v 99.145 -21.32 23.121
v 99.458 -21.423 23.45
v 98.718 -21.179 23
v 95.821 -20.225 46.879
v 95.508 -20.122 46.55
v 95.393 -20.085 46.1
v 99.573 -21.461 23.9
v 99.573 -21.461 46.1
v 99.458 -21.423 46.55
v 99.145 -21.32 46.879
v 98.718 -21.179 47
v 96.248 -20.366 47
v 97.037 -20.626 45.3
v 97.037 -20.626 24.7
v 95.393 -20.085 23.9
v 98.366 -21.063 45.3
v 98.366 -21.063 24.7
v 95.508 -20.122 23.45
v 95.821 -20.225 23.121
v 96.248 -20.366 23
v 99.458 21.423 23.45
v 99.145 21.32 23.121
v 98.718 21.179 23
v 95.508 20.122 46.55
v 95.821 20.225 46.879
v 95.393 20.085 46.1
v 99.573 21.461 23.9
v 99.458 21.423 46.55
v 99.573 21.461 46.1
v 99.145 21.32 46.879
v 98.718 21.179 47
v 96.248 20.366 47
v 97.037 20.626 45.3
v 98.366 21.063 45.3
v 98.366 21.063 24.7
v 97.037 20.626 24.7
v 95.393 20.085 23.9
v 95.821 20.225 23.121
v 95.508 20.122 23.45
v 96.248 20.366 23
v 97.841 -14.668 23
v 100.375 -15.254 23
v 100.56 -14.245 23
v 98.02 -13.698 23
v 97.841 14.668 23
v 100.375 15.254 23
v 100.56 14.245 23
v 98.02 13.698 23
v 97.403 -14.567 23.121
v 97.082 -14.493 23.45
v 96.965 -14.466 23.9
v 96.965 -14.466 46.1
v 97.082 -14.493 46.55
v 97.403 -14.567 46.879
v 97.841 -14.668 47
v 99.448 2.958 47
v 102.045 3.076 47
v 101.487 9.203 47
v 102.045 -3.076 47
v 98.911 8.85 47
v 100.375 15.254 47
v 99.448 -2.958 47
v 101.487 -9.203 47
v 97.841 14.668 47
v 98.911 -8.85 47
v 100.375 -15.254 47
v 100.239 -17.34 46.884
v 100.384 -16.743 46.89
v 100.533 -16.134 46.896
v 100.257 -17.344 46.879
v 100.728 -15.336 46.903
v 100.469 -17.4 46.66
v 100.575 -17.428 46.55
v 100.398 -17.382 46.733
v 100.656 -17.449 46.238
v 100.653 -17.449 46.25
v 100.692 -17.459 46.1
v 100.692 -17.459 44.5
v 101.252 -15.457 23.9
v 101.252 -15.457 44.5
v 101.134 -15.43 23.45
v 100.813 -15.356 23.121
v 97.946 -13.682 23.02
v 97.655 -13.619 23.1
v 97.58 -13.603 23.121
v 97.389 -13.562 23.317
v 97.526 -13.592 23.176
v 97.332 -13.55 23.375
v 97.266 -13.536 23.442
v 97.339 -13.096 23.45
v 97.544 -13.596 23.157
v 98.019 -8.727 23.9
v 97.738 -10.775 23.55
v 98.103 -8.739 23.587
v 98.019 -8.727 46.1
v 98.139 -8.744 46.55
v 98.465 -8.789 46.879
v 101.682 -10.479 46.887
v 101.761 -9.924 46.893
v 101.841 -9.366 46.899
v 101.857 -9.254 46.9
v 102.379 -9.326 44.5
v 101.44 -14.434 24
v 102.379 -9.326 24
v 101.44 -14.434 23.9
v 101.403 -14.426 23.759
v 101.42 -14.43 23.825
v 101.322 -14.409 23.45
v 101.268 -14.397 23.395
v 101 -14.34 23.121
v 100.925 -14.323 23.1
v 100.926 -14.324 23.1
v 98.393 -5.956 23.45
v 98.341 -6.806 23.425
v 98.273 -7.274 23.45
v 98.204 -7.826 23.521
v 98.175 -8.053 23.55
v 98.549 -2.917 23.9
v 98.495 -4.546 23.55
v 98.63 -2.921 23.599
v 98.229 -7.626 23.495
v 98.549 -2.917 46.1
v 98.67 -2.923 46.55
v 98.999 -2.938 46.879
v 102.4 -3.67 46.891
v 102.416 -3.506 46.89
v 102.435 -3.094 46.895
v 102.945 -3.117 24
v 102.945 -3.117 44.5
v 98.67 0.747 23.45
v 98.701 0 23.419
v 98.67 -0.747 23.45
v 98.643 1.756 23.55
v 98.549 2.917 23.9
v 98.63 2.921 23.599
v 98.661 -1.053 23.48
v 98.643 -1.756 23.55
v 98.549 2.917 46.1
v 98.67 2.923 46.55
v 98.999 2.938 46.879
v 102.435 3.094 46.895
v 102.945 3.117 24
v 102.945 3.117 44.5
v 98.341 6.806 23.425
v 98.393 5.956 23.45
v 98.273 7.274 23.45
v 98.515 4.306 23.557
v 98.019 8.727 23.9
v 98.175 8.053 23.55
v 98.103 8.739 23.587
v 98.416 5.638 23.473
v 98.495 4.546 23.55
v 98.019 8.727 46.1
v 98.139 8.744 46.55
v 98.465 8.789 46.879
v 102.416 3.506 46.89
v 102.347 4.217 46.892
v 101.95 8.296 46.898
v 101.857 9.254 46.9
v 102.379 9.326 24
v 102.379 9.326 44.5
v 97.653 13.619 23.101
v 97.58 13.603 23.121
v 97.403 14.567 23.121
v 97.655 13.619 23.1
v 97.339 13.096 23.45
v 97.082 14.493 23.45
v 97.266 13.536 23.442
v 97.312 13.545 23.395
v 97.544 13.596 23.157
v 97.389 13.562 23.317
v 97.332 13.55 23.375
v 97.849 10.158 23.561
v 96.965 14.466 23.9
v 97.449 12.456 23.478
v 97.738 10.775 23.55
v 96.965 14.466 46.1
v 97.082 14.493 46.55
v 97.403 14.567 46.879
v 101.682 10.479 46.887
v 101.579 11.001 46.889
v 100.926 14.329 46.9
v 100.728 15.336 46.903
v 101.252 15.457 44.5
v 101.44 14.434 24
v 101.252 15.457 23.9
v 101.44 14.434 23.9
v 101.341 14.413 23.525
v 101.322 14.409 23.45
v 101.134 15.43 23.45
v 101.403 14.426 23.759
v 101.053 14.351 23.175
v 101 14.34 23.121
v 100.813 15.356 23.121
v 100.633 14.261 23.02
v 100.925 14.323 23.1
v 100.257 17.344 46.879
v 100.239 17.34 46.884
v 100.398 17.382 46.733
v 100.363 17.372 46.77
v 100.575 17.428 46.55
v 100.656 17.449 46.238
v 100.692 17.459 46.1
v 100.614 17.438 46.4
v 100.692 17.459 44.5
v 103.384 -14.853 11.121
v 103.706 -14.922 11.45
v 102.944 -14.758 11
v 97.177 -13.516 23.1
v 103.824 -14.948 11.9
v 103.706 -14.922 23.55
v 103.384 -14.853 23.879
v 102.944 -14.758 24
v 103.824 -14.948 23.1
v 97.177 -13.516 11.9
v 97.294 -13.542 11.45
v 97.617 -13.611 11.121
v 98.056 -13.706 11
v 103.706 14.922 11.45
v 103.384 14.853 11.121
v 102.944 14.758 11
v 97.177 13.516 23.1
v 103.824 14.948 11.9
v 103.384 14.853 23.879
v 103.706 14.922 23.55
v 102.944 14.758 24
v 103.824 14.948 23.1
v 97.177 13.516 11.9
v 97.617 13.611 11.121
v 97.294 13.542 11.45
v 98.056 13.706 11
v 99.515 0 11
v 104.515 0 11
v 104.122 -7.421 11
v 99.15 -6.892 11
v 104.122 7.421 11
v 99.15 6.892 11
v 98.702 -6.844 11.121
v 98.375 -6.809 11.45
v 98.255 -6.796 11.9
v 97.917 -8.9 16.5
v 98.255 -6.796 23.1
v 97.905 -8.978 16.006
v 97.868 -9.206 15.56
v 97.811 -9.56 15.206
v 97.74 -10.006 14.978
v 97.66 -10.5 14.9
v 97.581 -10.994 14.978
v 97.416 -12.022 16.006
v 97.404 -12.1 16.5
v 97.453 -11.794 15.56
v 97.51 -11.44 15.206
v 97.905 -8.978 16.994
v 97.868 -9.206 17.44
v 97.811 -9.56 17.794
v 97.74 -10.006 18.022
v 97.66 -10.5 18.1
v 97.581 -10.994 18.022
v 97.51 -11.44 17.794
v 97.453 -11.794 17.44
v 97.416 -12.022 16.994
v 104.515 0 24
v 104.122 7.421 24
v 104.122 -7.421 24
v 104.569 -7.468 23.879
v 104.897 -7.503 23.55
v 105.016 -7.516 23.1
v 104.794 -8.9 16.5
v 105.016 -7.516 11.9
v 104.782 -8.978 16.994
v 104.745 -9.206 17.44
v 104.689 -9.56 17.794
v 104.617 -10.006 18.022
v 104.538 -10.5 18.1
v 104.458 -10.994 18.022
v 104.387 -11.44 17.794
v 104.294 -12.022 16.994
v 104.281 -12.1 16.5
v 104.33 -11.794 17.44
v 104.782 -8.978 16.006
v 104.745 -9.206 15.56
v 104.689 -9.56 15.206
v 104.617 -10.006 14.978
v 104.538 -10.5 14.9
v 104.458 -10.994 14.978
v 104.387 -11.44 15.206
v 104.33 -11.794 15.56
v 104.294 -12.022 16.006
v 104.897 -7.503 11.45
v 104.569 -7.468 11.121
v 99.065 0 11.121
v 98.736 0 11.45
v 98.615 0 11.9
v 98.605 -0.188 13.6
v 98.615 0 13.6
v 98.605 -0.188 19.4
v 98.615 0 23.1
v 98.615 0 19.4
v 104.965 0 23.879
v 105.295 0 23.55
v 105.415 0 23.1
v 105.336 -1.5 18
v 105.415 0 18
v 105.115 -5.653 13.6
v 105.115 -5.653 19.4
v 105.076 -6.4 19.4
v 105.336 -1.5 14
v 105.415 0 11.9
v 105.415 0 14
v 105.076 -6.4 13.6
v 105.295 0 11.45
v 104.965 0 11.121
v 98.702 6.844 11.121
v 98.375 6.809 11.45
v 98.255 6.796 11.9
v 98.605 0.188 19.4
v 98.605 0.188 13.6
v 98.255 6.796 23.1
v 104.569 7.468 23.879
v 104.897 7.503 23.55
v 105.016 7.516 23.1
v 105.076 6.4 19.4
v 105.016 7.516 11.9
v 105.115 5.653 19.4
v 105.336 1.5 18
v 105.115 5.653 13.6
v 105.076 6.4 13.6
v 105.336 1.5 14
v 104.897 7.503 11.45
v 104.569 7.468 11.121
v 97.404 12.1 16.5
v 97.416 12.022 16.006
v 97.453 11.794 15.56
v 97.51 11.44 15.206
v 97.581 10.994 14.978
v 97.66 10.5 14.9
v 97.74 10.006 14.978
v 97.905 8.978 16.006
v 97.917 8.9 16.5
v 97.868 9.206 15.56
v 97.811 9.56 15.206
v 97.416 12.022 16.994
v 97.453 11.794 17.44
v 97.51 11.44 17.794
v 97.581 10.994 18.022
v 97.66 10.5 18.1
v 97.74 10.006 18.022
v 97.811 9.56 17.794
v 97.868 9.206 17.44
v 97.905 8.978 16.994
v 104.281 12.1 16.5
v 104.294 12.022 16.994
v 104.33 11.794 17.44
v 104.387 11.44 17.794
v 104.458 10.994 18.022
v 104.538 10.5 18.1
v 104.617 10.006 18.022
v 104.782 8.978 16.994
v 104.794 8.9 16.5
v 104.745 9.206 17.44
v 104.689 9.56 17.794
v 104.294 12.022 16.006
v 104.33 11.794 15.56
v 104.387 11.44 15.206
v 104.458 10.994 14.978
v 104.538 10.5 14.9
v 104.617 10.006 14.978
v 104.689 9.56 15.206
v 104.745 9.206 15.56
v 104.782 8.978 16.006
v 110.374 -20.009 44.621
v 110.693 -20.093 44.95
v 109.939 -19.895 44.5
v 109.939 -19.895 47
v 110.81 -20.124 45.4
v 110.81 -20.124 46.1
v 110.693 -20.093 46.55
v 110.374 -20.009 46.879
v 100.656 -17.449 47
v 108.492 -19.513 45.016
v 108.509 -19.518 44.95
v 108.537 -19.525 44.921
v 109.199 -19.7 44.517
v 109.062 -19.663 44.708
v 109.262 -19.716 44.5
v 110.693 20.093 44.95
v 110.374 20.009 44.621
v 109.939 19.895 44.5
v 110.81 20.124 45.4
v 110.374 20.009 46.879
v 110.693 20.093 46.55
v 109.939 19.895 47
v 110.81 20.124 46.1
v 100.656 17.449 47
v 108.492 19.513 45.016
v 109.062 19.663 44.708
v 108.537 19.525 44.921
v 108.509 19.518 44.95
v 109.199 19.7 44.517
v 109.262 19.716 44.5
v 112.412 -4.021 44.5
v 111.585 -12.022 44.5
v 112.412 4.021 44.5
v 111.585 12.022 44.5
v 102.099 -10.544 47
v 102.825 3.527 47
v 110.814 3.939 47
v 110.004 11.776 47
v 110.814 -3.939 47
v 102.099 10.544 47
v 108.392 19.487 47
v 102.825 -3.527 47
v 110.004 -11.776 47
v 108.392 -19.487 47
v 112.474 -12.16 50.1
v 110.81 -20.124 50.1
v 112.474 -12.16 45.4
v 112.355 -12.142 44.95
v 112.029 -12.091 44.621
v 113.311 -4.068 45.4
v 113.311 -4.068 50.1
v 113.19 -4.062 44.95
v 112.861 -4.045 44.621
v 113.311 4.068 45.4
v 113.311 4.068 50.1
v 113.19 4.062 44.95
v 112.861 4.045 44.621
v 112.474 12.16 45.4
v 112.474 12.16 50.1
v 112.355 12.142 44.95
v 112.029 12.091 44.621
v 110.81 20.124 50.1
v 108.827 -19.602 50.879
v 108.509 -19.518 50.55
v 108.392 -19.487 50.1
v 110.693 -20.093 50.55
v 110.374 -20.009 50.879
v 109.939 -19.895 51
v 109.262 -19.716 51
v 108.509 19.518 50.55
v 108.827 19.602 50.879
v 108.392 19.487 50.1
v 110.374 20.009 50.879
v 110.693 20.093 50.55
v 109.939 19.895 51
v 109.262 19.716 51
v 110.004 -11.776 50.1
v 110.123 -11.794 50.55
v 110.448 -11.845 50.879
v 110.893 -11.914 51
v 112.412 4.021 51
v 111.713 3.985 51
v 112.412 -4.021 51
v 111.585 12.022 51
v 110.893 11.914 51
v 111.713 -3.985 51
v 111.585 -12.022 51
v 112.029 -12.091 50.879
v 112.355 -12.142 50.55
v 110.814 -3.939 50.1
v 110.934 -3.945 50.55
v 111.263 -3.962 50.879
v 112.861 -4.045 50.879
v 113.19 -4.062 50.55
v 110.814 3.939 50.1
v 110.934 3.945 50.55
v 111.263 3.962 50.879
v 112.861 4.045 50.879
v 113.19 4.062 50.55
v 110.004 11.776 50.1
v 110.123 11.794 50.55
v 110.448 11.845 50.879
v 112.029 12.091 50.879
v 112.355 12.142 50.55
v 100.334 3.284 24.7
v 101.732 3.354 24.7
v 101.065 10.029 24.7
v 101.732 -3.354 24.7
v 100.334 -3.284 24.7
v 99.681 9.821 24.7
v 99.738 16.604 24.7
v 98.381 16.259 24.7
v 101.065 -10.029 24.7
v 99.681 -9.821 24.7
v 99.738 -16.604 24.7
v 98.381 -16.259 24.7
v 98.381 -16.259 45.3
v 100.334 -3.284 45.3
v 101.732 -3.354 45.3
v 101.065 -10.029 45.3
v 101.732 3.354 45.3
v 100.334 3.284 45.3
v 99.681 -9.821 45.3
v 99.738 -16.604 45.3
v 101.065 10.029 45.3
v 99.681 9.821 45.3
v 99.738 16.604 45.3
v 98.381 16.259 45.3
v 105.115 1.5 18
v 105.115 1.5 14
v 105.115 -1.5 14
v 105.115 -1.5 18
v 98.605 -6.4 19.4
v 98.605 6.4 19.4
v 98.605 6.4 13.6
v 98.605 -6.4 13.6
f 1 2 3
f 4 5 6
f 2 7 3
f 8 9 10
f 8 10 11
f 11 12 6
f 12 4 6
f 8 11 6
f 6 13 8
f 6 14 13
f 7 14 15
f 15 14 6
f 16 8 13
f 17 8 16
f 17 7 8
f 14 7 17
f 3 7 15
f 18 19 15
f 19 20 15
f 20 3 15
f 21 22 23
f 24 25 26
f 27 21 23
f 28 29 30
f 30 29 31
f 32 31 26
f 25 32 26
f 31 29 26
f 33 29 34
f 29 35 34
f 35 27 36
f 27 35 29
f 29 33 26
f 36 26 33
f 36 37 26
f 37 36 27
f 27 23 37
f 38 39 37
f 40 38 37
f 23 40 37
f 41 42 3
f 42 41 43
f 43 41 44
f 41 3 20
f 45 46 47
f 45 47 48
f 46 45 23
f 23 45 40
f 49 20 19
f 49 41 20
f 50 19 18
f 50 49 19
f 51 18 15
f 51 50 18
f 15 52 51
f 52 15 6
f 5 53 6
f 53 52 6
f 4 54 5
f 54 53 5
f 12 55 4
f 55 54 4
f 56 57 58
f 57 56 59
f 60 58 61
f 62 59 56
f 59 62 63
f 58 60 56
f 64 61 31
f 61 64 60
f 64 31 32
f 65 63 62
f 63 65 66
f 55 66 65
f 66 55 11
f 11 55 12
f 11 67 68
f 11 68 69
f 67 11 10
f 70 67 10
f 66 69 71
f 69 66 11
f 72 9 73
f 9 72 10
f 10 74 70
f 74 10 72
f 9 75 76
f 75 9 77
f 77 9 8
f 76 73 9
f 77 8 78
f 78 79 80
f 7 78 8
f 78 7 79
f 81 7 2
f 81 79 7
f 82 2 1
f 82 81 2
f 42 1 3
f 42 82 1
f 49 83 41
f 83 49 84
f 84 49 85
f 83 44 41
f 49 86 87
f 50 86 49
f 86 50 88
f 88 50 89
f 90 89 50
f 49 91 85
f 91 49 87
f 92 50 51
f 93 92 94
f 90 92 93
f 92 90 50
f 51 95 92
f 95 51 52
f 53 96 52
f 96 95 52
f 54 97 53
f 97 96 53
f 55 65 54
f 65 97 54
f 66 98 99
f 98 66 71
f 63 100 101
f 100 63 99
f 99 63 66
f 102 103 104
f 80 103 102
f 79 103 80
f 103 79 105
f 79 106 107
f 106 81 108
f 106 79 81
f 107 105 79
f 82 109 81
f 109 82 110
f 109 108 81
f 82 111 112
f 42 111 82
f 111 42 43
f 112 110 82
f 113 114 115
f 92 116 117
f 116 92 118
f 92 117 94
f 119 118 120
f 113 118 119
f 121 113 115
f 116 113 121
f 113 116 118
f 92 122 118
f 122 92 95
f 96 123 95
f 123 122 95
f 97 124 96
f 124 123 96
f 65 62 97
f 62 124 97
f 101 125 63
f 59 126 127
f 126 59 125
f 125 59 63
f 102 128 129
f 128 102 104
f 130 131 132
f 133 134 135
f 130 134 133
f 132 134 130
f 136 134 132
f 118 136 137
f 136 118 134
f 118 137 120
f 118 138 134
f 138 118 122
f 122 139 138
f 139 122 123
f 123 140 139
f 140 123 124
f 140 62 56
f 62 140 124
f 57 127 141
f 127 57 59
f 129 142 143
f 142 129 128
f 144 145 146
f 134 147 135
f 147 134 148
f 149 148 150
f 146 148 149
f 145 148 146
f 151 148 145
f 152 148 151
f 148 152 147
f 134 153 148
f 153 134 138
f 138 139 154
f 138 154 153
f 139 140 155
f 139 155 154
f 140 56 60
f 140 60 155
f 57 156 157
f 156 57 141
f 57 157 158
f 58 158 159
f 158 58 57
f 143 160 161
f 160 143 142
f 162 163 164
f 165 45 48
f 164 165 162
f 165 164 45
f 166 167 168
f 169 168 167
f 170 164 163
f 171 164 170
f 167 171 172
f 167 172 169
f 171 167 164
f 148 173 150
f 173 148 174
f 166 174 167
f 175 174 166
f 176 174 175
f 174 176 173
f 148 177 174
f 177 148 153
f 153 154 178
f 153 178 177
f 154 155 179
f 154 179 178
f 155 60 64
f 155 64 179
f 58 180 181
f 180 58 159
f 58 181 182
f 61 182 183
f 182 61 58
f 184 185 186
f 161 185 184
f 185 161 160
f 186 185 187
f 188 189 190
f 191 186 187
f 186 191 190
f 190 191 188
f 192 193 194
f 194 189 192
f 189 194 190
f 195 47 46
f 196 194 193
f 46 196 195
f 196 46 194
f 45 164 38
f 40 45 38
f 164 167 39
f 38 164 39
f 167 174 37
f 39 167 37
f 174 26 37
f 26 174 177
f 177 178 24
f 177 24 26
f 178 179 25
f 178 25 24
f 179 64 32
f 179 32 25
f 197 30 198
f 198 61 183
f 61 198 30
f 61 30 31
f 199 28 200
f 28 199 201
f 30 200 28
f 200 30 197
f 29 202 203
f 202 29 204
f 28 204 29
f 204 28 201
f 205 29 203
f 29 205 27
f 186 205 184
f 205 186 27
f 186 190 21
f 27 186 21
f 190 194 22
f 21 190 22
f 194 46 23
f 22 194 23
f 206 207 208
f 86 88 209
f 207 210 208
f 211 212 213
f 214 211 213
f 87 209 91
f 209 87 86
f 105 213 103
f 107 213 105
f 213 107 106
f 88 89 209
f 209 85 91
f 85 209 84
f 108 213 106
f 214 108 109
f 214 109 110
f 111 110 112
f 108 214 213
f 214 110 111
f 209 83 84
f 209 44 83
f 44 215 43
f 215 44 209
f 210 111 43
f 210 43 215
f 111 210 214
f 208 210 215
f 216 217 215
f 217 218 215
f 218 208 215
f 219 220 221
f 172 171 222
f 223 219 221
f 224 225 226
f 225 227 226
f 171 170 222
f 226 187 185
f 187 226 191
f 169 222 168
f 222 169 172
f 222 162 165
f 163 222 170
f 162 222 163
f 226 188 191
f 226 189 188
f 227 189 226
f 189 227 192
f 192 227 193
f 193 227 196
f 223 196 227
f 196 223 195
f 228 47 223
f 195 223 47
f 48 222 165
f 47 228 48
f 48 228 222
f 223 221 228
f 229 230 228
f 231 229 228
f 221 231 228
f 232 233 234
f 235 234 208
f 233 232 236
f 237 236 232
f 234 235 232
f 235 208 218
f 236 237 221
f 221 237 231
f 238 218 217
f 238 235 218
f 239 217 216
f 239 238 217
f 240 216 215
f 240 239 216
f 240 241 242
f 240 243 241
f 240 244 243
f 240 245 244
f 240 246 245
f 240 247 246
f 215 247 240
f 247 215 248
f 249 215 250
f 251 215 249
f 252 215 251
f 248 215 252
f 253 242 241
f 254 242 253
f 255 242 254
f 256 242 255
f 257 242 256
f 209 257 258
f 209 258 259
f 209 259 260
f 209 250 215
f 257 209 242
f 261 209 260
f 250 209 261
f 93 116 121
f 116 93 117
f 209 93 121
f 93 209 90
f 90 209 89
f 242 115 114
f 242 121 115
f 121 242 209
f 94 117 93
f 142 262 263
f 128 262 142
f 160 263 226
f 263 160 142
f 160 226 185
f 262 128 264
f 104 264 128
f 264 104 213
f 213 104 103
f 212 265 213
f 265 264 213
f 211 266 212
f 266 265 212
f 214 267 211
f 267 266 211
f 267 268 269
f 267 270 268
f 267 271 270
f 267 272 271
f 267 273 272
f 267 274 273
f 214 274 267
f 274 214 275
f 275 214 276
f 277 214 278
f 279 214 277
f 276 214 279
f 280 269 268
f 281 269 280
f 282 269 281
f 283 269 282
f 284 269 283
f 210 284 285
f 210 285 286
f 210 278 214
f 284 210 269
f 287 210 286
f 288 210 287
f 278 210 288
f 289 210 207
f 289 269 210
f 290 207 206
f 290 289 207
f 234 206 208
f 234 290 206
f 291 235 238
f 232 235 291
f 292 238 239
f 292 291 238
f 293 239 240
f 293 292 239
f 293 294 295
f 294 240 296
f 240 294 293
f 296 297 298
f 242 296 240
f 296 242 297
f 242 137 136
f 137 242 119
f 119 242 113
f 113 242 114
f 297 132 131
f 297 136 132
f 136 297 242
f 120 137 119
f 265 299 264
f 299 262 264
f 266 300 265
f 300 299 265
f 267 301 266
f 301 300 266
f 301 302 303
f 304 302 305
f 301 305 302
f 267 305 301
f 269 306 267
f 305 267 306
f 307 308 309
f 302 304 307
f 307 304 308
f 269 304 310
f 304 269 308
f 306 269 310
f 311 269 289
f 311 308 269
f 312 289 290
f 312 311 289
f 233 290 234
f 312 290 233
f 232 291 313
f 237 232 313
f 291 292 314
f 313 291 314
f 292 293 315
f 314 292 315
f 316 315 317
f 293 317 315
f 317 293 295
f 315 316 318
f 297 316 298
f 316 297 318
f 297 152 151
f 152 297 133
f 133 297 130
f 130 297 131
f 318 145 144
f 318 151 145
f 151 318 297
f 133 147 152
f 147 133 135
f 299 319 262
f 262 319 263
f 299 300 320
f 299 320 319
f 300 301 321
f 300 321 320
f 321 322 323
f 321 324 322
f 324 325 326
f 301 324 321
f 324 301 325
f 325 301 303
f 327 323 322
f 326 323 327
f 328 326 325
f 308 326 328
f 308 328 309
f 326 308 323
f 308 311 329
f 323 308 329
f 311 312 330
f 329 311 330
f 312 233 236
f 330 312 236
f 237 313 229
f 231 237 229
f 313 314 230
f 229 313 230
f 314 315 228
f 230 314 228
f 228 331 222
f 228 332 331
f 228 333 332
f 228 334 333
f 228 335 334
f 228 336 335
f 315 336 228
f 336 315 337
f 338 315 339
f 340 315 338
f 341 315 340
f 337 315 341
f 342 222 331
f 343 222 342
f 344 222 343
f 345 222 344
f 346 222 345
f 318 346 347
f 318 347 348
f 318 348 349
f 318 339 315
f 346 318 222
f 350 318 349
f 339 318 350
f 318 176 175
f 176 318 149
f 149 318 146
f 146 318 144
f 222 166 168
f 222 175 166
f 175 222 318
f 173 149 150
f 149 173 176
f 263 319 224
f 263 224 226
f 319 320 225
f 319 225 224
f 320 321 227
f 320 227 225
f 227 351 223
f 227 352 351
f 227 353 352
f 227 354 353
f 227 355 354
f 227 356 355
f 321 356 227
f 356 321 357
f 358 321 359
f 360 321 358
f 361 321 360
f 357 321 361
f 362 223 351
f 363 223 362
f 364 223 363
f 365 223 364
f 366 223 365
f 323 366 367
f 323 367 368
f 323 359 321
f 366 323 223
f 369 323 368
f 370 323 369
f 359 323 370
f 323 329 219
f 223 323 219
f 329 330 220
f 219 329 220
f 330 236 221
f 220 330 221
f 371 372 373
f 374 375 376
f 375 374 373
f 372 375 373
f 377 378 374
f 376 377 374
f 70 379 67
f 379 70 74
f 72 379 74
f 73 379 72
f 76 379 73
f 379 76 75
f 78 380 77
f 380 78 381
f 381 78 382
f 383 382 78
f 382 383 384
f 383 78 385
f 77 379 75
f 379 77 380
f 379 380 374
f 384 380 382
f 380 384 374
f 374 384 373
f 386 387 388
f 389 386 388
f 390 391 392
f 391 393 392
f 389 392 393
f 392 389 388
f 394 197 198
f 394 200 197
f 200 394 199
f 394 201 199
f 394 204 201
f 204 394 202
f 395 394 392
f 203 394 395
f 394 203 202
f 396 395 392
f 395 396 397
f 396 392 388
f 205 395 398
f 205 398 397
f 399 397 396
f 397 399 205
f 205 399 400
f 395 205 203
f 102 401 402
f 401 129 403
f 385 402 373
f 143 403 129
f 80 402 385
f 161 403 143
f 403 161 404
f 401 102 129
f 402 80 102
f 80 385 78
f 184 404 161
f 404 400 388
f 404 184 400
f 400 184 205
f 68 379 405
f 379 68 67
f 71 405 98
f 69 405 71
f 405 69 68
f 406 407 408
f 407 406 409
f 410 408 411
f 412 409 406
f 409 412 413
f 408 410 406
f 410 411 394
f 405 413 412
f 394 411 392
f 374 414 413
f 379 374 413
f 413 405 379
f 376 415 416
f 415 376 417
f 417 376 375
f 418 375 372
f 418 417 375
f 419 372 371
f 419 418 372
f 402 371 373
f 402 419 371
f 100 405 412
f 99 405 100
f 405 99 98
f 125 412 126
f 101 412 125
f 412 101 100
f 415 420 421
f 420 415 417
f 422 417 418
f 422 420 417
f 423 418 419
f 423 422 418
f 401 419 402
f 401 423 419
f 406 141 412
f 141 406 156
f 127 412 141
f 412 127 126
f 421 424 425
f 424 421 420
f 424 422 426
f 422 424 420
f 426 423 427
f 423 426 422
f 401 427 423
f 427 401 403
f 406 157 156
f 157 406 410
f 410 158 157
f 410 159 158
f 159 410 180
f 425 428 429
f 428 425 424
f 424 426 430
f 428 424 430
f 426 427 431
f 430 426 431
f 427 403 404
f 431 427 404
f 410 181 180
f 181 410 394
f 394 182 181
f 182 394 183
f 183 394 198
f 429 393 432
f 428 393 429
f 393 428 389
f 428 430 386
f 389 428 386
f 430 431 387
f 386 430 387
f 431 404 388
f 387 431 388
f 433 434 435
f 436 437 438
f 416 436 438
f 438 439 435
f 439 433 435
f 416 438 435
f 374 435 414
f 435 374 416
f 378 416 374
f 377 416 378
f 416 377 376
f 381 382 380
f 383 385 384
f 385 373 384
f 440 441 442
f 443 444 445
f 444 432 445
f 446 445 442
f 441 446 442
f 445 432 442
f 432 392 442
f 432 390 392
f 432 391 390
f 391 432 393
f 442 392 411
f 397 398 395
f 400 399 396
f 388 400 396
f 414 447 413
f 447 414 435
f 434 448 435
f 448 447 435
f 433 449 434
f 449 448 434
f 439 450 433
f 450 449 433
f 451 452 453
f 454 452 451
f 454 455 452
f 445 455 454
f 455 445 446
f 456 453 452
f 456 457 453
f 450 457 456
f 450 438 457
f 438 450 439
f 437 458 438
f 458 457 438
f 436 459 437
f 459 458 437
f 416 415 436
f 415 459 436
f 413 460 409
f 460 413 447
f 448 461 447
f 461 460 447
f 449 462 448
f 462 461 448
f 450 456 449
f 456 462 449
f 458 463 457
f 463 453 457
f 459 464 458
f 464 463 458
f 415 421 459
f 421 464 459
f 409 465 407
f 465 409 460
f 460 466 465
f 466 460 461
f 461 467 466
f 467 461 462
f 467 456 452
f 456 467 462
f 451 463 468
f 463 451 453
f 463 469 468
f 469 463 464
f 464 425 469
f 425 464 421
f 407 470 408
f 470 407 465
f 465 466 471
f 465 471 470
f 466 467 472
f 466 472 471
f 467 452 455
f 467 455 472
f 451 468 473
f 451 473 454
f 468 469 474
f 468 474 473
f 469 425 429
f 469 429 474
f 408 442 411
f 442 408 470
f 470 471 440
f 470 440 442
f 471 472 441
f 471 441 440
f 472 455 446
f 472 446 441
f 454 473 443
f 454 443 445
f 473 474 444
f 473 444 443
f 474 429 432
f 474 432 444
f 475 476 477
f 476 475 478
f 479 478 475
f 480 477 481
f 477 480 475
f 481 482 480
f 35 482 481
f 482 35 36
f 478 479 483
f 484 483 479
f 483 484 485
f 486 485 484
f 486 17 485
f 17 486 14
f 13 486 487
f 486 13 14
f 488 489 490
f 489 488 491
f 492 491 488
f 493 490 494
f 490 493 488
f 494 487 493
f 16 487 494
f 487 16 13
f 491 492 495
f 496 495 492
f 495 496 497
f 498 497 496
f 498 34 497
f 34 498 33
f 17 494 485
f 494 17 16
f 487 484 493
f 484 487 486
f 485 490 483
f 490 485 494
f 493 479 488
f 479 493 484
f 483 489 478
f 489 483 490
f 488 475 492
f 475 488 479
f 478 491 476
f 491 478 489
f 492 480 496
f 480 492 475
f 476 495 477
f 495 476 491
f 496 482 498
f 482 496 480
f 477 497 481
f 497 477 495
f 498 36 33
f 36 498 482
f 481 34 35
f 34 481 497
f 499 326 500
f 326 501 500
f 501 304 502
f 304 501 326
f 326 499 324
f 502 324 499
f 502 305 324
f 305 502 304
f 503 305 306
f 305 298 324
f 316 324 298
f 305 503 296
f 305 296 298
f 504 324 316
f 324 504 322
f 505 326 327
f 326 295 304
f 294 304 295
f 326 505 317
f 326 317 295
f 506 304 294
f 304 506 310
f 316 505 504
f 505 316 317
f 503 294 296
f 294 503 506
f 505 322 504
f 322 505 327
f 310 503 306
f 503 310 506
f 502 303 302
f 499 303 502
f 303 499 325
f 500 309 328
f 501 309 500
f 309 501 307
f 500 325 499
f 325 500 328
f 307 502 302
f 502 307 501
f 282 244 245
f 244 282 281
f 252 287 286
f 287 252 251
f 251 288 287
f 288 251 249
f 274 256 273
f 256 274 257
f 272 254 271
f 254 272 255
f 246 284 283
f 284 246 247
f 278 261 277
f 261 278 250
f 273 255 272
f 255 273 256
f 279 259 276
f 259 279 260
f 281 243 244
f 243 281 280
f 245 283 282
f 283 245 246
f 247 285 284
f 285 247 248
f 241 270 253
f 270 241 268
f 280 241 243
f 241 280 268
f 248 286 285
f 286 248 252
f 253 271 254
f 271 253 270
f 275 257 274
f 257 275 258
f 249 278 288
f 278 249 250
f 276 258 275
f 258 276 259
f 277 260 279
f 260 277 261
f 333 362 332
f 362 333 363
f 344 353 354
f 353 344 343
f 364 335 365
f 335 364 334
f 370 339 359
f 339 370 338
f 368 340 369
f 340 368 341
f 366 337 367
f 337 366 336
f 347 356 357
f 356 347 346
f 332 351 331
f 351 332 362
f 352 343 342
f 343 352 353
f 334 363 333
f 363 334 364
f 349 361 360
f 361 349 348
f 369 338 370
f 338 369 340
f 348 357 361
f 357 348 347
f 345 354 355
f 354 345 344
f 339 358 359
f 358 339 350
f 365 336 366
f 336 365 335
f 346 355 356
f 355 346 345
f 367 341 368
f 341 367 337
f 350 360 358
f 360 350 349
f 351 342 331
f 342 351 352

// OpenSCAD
// H13_forehead_node  (qty 1; frame: H; MJF PA12; needs one fit iteration (forehead curve))
// GENERATED by gen_halo_stl.py from halo_parts.py. Change numbers in halo_params.scad.
// Every dimension below is an expression of the names in halo_params.scad.
include <../halo_params.scad>

difference() {
    union() {
        translate([X_NC, 0, 0]) {
            rotate([0, 0, -((NODE_HALF / R_NB) * 57.29578)]) {
                rotate_extrude(angle = 2 * ((NODE_HALF / R_NB) * 57.29578), $fn = 72) polygon([[R_NB + 2.6 - 0.9 + 0, BAND_Z_FRONT - 12 + 0.9 + -0.9], [R_NB + 2.6 - 0.9 + 0.45, BAND_Z_FRONT - 12 + 0.9 + -0.779423], [R_NB + 2.6 - 0.9 + 0.779423, BAND_Z_FRONT - 12 + 0.9 + -0.45], [R_NB + 2.6 - 0.9 + 0.9, BAND_Z_FRONT - 12 + 0.9 + 0], [R_NB + 2.6 - 0.9 + 0.9, BAND_Z_FRONT + 12 - 0.9 + 0], [R_NB + 2.6 - 0.9 + 0.779423, BAND_Z_FRONT + 12 - 0.9 + 0.45], [R_NB + 2.6 - 0.9 + 0.45, BAND_Z_FRONT + 12 - 0.9 + 0.779423], [R_NB + 2.6 - 0.9 + 0, BAND_Z_FRONT + 12 - 0.9 + 0.9], [R_NB - 1.8 + 0.9 + 0, BAND_Z_FRONT + 12 - 0.9 + 0.9], [R_NB - 1.8 + 0.9 + -0.45, BAND_Z_FRONT + 12 - 0.9 + 0.779423], [R_NB - 1.8 + 0.9 + -0.779423, BAND_Z_FRONT + 12 - 0.9 + 0.45], [R_NB - 1.8 + 0.9 + -0.9, BAND_Z_FRONT + 12 - 0.9 + 0], [R_NB - 1.8 + 0.9 + -0.9, BAND_Z_FRONT - 12 + 0.9 + 0], [R_NB - 1.8 + 0.9 + -0.779423, BAND_Z_FRONT - 12 + 0.9 + -0.45], [R_NB - 1.8 + 0.9 + -0.45, BAND_Z_FRONT - 12 + 0.9 + -0.779423], [R_NB - 1.8 + 0.9 + 0, BAND_Z_FRONT - 12 + 0.9 + -0.9]]);
            }
        }
        translate([X_NC, 0, 0]) {
            rotate([0, 0, -((14 / R_NB) * 57.29578)]) {
                rotate_extrude(angle = 2 * ((14 / R_NB) * 57.29578), $fn = 72) polygon([[R_NB + 5 - 0.9 + 0, BAND_Z_FRONT - 24 + 0.9 + -0.9], [R_NB + 5 - 0.9 + 0.45, BAND_Z_FRONT - 24 + 0.9 + -0.779423], [R_NB + 5 - 0.9 + 0.779423, BAND_Z_FRONT - 24 + 0.9 + -0.45], [R_NB + 5 - 0.9 + 0.9, BAND_Z_FRONT - 24 + 0.9 + 0], [R_NB + 5 - 0.9 + 0.9, BAND_Z_FRONT - 11 - 0.9 + 0], [R_NB + 5 - 0.9 + 0.779423, BAND_Z_FRONT - 11 - 0.9 + 0.45], [R_NB + 5 - 0.9 + 0.45, BAND_Z_FRONT - 11 - 0.9 + 0.779423], [R_NB + 5 - 0.9 + 0, BAND_Z_FRONT - 11 - 0.9 + 0.9], [R_NB - 1.8 + 0.9 + 0, BAND_Z_FRONT - 11 - 0.9 + 0.9], [R_NB - 1.8 + 0.9 + -0.45, BAND_Z_FRONT - 11 - 0.9 + 0.779423], [R_NB - 1.8 + 0.9 + -0.779423, BAND_Z_FRONT - 11 - 0.9 + 0.45], [R_NB - 1.8 + 0.9 + -0.9, BAND_Z_FRONT - 11 - 0.9 + 0], [R_NB - 1.8 + 0.9 + -0.9, BAND_Z_FRONT - 24 + 0.9 + 0], [R_NB - 1.8 + 0.9 + -0.779423, BAND_Z_FRONT - 24 + 0.9 + -0.45], [R_NB - 1.8 + 0.9 + -0.45, BAND_Z_FRONT - 24 + 0.9 + -0.779423], [R_NB - 1.8 + 0.9 + 0, BAND_Z_FRONT - 24 + 0.9 + -0.9]]);
            }
        }
        translate([X_NC, 0, 0]) {
            rotate([0, 0, -((17 / R_NB) * 57.29578)]) {
                rotate_extrude(angle = 2 * ((17 / R_NB) * 57.29578), $fn = 72) polygon([[R_NB + 13 - 0.9 + 0, BAND_Z_FRONT + 9.5 + 0.9 + -0.9], [R_NB + 13 - 0.9 + 0.45, BAND_Z_FRONT + 9.5 + 0.9 + -0.779423], [R_NB + 13 - 0.9 + 0.779423, BAND_Z_FRONT + 9.5 + 0.9 + -0.45], [R_NB + 13 - 0.9 + 0.9, BAND_Z_FRONT + 9.5 + 0.9 + 0], [R_NB + 13 - 0.9 + 0.9, BAND_Z_FRONT + 12 - 0.9 + 0], [R_NB + 13 - 0.9 + 0.779423, BAND_Z_FRONT + 12 - 0.9 + 0.45], [R_NB + 13 - 0.9 + 0.45, BAND_Z_FRONT + 12 - 0.9 + 0.779423], [R_NB + 13 - 0.9 + 0, BAND_Z_FRONT + 12 - 0.9 + 0.9], [R_NB + 1.6 + 0.9 + 0, BAND_Z_FRONT + 12 - 0.9 + 0.9], [R_NB + 1.6 + 0.9 + -0.45, BAND_Z_FRONT + 12 - 0.9 + 0.779423], [R_NB + 1.6 + 0.9 + -0.779423, BAND_Z_FRONT + 12 - 0.9 + 0.45], [R_NB + 1.6 + 0.9 + -0.9, BAND_Z_FRONT + 12 - 0.9 + 0], [R_NB + 1.6 + 0.9 + -0.9, BAND_Z_FRONT + 9.5 + 0.9 + 0], [R_NB + 1.6 + 0.9 + -0.779423, BAND_Z_FRONT + 9.5 + 0.9 + -0.45], [R_NB + 1.6 + 0.9 + -0.45, BAND_Z_FRONT + 9.5 + 0.9 + -0.779423], [R_NB + 1.6 + 0.9 + 0, BAND_Z_FRONT + 9.5 + 0.9 + -0.9]]);
            }
        }
        translate([X_NC, 0, 0]) {
            rotate([0, 0, -((17 / R_NB) * 57.29578)]) {
                rotate_extrude(angle = 2 * ((17 / R_NB) * 57.29578), $fn = 72) polygon([[R_NB + 13 - 0.9 + 0, BAND_Z_FRONT + 9.5 + 0.9 + -0.9], [R_NB + 13 - 0.9 + 0.45, BAND_Z_FRONT + 9.5 + 0.9 + -0.779423], [R_NB + 13 - 0.9 + 0.779423, BAND_Z_FRONT + 9.5 + 0.9 + -0.45], [R_NB + 13 - 0.9 + 0.9, BAND_Z_FRONT + 9.5 + 0.9 + 0], [R_NB + 13 - 0.9 + 0.9, BAND_Z_FRONT + 16 - 0.9 + 0], [R_NB + 13 - 0.9 + 0.779423, BAND_Z_FRONT + 16 - 0.9 + 0.45], [R_NB + 13 - 0.9 + 0.45, BAND_Z_FRONT + 16 - 0.9 + 0.779423], [R_NB + 13 - 0.9 + 0, BAND_Z_FRONT + 16 - 0.9 + 0.9], [R_NB + 10.5 + 0.9 + 0, BAND_Z_FRONT + 16 - 0.9 + 0.9], [R_NB + 10.5 + 0.9 + -0.45, BAND_Z_FRONT + 16 - 0.9 + 0.779423], [R_NB + 10.5 + 0.9 + -0.779423, BAND_Z_FRONT + 16 - 0.9 + 0.45], [R_NB + 10.5 + 0.9 + -0.9, BAND_Z_FRONT + 16 - 0.9 + 0], [R_NB + 10.5 + 0.9 + -0.9, BAND_Z_FRONT + 9.5 + 0.9 + 0], [R_NB + 10.5 + 0.9 + -0.779423, BAND_Z_FRONT + 9.5 + 0.9 + -0.45], [R_NB + 10.5 + 0.9 + -0.45, BAND_Z_FRONT + 9.5 + 0.9 + -0.779423], [R_NB + 10.5 + 0.9 + 0, BAND_Z_FRONT + 9.5 + 0.9 + -0.9]]);
            }
        }
    }
    translate([X_NC, 0, 0]) {
        rotate([0, 0, -(((NODE_HALF + 2) / R_NB) * 57.29578)]) {
            rotate_extrude(angle = 2 * (((NODE_HALF + 2) / R_NB) * 57.29578), $fn = 72) polygon([[R_NB, BAND_Z_FRONT - 10.3], [R_NB + 1.4, BAND_Z_FRONT - 10.3], [R_NB + 1.4, BAND_Z_FRONT + 10.3], [R_NB, BAND_Z_FRONT + 10.3]]);
        }
    }
    translate([X_NC + R_NB - 1.81, (-SW_L) / 2, BAND_Z_FRONT - 21.4]) {
        cube([SW_H + 0.01, SW_L, SW_W], center = false);
    }
    translate([X_NC + R_NB + 3, -1.5, BAND_Z_FRONT - 21]) {
        cube([4, 3, 4], center = false);
    }
    translate([X_NC + R_NB - 4, -10.5, BAND_Z_FRONT - 18.5]) {
        rotate([0, 90, 0]) {
            cylinder(h = 12, r = 1.6, center = false, $fn = 20);
        }
    }
    translate([X_NC + R_NB - 4, 10.5, BAND_Z_FRONT - 18.5]) {
        rotate([0, 90, 0]) {
            cylinder(h = 12, r = 1.6, center = false, $fn = 20);
        }
    }
}
